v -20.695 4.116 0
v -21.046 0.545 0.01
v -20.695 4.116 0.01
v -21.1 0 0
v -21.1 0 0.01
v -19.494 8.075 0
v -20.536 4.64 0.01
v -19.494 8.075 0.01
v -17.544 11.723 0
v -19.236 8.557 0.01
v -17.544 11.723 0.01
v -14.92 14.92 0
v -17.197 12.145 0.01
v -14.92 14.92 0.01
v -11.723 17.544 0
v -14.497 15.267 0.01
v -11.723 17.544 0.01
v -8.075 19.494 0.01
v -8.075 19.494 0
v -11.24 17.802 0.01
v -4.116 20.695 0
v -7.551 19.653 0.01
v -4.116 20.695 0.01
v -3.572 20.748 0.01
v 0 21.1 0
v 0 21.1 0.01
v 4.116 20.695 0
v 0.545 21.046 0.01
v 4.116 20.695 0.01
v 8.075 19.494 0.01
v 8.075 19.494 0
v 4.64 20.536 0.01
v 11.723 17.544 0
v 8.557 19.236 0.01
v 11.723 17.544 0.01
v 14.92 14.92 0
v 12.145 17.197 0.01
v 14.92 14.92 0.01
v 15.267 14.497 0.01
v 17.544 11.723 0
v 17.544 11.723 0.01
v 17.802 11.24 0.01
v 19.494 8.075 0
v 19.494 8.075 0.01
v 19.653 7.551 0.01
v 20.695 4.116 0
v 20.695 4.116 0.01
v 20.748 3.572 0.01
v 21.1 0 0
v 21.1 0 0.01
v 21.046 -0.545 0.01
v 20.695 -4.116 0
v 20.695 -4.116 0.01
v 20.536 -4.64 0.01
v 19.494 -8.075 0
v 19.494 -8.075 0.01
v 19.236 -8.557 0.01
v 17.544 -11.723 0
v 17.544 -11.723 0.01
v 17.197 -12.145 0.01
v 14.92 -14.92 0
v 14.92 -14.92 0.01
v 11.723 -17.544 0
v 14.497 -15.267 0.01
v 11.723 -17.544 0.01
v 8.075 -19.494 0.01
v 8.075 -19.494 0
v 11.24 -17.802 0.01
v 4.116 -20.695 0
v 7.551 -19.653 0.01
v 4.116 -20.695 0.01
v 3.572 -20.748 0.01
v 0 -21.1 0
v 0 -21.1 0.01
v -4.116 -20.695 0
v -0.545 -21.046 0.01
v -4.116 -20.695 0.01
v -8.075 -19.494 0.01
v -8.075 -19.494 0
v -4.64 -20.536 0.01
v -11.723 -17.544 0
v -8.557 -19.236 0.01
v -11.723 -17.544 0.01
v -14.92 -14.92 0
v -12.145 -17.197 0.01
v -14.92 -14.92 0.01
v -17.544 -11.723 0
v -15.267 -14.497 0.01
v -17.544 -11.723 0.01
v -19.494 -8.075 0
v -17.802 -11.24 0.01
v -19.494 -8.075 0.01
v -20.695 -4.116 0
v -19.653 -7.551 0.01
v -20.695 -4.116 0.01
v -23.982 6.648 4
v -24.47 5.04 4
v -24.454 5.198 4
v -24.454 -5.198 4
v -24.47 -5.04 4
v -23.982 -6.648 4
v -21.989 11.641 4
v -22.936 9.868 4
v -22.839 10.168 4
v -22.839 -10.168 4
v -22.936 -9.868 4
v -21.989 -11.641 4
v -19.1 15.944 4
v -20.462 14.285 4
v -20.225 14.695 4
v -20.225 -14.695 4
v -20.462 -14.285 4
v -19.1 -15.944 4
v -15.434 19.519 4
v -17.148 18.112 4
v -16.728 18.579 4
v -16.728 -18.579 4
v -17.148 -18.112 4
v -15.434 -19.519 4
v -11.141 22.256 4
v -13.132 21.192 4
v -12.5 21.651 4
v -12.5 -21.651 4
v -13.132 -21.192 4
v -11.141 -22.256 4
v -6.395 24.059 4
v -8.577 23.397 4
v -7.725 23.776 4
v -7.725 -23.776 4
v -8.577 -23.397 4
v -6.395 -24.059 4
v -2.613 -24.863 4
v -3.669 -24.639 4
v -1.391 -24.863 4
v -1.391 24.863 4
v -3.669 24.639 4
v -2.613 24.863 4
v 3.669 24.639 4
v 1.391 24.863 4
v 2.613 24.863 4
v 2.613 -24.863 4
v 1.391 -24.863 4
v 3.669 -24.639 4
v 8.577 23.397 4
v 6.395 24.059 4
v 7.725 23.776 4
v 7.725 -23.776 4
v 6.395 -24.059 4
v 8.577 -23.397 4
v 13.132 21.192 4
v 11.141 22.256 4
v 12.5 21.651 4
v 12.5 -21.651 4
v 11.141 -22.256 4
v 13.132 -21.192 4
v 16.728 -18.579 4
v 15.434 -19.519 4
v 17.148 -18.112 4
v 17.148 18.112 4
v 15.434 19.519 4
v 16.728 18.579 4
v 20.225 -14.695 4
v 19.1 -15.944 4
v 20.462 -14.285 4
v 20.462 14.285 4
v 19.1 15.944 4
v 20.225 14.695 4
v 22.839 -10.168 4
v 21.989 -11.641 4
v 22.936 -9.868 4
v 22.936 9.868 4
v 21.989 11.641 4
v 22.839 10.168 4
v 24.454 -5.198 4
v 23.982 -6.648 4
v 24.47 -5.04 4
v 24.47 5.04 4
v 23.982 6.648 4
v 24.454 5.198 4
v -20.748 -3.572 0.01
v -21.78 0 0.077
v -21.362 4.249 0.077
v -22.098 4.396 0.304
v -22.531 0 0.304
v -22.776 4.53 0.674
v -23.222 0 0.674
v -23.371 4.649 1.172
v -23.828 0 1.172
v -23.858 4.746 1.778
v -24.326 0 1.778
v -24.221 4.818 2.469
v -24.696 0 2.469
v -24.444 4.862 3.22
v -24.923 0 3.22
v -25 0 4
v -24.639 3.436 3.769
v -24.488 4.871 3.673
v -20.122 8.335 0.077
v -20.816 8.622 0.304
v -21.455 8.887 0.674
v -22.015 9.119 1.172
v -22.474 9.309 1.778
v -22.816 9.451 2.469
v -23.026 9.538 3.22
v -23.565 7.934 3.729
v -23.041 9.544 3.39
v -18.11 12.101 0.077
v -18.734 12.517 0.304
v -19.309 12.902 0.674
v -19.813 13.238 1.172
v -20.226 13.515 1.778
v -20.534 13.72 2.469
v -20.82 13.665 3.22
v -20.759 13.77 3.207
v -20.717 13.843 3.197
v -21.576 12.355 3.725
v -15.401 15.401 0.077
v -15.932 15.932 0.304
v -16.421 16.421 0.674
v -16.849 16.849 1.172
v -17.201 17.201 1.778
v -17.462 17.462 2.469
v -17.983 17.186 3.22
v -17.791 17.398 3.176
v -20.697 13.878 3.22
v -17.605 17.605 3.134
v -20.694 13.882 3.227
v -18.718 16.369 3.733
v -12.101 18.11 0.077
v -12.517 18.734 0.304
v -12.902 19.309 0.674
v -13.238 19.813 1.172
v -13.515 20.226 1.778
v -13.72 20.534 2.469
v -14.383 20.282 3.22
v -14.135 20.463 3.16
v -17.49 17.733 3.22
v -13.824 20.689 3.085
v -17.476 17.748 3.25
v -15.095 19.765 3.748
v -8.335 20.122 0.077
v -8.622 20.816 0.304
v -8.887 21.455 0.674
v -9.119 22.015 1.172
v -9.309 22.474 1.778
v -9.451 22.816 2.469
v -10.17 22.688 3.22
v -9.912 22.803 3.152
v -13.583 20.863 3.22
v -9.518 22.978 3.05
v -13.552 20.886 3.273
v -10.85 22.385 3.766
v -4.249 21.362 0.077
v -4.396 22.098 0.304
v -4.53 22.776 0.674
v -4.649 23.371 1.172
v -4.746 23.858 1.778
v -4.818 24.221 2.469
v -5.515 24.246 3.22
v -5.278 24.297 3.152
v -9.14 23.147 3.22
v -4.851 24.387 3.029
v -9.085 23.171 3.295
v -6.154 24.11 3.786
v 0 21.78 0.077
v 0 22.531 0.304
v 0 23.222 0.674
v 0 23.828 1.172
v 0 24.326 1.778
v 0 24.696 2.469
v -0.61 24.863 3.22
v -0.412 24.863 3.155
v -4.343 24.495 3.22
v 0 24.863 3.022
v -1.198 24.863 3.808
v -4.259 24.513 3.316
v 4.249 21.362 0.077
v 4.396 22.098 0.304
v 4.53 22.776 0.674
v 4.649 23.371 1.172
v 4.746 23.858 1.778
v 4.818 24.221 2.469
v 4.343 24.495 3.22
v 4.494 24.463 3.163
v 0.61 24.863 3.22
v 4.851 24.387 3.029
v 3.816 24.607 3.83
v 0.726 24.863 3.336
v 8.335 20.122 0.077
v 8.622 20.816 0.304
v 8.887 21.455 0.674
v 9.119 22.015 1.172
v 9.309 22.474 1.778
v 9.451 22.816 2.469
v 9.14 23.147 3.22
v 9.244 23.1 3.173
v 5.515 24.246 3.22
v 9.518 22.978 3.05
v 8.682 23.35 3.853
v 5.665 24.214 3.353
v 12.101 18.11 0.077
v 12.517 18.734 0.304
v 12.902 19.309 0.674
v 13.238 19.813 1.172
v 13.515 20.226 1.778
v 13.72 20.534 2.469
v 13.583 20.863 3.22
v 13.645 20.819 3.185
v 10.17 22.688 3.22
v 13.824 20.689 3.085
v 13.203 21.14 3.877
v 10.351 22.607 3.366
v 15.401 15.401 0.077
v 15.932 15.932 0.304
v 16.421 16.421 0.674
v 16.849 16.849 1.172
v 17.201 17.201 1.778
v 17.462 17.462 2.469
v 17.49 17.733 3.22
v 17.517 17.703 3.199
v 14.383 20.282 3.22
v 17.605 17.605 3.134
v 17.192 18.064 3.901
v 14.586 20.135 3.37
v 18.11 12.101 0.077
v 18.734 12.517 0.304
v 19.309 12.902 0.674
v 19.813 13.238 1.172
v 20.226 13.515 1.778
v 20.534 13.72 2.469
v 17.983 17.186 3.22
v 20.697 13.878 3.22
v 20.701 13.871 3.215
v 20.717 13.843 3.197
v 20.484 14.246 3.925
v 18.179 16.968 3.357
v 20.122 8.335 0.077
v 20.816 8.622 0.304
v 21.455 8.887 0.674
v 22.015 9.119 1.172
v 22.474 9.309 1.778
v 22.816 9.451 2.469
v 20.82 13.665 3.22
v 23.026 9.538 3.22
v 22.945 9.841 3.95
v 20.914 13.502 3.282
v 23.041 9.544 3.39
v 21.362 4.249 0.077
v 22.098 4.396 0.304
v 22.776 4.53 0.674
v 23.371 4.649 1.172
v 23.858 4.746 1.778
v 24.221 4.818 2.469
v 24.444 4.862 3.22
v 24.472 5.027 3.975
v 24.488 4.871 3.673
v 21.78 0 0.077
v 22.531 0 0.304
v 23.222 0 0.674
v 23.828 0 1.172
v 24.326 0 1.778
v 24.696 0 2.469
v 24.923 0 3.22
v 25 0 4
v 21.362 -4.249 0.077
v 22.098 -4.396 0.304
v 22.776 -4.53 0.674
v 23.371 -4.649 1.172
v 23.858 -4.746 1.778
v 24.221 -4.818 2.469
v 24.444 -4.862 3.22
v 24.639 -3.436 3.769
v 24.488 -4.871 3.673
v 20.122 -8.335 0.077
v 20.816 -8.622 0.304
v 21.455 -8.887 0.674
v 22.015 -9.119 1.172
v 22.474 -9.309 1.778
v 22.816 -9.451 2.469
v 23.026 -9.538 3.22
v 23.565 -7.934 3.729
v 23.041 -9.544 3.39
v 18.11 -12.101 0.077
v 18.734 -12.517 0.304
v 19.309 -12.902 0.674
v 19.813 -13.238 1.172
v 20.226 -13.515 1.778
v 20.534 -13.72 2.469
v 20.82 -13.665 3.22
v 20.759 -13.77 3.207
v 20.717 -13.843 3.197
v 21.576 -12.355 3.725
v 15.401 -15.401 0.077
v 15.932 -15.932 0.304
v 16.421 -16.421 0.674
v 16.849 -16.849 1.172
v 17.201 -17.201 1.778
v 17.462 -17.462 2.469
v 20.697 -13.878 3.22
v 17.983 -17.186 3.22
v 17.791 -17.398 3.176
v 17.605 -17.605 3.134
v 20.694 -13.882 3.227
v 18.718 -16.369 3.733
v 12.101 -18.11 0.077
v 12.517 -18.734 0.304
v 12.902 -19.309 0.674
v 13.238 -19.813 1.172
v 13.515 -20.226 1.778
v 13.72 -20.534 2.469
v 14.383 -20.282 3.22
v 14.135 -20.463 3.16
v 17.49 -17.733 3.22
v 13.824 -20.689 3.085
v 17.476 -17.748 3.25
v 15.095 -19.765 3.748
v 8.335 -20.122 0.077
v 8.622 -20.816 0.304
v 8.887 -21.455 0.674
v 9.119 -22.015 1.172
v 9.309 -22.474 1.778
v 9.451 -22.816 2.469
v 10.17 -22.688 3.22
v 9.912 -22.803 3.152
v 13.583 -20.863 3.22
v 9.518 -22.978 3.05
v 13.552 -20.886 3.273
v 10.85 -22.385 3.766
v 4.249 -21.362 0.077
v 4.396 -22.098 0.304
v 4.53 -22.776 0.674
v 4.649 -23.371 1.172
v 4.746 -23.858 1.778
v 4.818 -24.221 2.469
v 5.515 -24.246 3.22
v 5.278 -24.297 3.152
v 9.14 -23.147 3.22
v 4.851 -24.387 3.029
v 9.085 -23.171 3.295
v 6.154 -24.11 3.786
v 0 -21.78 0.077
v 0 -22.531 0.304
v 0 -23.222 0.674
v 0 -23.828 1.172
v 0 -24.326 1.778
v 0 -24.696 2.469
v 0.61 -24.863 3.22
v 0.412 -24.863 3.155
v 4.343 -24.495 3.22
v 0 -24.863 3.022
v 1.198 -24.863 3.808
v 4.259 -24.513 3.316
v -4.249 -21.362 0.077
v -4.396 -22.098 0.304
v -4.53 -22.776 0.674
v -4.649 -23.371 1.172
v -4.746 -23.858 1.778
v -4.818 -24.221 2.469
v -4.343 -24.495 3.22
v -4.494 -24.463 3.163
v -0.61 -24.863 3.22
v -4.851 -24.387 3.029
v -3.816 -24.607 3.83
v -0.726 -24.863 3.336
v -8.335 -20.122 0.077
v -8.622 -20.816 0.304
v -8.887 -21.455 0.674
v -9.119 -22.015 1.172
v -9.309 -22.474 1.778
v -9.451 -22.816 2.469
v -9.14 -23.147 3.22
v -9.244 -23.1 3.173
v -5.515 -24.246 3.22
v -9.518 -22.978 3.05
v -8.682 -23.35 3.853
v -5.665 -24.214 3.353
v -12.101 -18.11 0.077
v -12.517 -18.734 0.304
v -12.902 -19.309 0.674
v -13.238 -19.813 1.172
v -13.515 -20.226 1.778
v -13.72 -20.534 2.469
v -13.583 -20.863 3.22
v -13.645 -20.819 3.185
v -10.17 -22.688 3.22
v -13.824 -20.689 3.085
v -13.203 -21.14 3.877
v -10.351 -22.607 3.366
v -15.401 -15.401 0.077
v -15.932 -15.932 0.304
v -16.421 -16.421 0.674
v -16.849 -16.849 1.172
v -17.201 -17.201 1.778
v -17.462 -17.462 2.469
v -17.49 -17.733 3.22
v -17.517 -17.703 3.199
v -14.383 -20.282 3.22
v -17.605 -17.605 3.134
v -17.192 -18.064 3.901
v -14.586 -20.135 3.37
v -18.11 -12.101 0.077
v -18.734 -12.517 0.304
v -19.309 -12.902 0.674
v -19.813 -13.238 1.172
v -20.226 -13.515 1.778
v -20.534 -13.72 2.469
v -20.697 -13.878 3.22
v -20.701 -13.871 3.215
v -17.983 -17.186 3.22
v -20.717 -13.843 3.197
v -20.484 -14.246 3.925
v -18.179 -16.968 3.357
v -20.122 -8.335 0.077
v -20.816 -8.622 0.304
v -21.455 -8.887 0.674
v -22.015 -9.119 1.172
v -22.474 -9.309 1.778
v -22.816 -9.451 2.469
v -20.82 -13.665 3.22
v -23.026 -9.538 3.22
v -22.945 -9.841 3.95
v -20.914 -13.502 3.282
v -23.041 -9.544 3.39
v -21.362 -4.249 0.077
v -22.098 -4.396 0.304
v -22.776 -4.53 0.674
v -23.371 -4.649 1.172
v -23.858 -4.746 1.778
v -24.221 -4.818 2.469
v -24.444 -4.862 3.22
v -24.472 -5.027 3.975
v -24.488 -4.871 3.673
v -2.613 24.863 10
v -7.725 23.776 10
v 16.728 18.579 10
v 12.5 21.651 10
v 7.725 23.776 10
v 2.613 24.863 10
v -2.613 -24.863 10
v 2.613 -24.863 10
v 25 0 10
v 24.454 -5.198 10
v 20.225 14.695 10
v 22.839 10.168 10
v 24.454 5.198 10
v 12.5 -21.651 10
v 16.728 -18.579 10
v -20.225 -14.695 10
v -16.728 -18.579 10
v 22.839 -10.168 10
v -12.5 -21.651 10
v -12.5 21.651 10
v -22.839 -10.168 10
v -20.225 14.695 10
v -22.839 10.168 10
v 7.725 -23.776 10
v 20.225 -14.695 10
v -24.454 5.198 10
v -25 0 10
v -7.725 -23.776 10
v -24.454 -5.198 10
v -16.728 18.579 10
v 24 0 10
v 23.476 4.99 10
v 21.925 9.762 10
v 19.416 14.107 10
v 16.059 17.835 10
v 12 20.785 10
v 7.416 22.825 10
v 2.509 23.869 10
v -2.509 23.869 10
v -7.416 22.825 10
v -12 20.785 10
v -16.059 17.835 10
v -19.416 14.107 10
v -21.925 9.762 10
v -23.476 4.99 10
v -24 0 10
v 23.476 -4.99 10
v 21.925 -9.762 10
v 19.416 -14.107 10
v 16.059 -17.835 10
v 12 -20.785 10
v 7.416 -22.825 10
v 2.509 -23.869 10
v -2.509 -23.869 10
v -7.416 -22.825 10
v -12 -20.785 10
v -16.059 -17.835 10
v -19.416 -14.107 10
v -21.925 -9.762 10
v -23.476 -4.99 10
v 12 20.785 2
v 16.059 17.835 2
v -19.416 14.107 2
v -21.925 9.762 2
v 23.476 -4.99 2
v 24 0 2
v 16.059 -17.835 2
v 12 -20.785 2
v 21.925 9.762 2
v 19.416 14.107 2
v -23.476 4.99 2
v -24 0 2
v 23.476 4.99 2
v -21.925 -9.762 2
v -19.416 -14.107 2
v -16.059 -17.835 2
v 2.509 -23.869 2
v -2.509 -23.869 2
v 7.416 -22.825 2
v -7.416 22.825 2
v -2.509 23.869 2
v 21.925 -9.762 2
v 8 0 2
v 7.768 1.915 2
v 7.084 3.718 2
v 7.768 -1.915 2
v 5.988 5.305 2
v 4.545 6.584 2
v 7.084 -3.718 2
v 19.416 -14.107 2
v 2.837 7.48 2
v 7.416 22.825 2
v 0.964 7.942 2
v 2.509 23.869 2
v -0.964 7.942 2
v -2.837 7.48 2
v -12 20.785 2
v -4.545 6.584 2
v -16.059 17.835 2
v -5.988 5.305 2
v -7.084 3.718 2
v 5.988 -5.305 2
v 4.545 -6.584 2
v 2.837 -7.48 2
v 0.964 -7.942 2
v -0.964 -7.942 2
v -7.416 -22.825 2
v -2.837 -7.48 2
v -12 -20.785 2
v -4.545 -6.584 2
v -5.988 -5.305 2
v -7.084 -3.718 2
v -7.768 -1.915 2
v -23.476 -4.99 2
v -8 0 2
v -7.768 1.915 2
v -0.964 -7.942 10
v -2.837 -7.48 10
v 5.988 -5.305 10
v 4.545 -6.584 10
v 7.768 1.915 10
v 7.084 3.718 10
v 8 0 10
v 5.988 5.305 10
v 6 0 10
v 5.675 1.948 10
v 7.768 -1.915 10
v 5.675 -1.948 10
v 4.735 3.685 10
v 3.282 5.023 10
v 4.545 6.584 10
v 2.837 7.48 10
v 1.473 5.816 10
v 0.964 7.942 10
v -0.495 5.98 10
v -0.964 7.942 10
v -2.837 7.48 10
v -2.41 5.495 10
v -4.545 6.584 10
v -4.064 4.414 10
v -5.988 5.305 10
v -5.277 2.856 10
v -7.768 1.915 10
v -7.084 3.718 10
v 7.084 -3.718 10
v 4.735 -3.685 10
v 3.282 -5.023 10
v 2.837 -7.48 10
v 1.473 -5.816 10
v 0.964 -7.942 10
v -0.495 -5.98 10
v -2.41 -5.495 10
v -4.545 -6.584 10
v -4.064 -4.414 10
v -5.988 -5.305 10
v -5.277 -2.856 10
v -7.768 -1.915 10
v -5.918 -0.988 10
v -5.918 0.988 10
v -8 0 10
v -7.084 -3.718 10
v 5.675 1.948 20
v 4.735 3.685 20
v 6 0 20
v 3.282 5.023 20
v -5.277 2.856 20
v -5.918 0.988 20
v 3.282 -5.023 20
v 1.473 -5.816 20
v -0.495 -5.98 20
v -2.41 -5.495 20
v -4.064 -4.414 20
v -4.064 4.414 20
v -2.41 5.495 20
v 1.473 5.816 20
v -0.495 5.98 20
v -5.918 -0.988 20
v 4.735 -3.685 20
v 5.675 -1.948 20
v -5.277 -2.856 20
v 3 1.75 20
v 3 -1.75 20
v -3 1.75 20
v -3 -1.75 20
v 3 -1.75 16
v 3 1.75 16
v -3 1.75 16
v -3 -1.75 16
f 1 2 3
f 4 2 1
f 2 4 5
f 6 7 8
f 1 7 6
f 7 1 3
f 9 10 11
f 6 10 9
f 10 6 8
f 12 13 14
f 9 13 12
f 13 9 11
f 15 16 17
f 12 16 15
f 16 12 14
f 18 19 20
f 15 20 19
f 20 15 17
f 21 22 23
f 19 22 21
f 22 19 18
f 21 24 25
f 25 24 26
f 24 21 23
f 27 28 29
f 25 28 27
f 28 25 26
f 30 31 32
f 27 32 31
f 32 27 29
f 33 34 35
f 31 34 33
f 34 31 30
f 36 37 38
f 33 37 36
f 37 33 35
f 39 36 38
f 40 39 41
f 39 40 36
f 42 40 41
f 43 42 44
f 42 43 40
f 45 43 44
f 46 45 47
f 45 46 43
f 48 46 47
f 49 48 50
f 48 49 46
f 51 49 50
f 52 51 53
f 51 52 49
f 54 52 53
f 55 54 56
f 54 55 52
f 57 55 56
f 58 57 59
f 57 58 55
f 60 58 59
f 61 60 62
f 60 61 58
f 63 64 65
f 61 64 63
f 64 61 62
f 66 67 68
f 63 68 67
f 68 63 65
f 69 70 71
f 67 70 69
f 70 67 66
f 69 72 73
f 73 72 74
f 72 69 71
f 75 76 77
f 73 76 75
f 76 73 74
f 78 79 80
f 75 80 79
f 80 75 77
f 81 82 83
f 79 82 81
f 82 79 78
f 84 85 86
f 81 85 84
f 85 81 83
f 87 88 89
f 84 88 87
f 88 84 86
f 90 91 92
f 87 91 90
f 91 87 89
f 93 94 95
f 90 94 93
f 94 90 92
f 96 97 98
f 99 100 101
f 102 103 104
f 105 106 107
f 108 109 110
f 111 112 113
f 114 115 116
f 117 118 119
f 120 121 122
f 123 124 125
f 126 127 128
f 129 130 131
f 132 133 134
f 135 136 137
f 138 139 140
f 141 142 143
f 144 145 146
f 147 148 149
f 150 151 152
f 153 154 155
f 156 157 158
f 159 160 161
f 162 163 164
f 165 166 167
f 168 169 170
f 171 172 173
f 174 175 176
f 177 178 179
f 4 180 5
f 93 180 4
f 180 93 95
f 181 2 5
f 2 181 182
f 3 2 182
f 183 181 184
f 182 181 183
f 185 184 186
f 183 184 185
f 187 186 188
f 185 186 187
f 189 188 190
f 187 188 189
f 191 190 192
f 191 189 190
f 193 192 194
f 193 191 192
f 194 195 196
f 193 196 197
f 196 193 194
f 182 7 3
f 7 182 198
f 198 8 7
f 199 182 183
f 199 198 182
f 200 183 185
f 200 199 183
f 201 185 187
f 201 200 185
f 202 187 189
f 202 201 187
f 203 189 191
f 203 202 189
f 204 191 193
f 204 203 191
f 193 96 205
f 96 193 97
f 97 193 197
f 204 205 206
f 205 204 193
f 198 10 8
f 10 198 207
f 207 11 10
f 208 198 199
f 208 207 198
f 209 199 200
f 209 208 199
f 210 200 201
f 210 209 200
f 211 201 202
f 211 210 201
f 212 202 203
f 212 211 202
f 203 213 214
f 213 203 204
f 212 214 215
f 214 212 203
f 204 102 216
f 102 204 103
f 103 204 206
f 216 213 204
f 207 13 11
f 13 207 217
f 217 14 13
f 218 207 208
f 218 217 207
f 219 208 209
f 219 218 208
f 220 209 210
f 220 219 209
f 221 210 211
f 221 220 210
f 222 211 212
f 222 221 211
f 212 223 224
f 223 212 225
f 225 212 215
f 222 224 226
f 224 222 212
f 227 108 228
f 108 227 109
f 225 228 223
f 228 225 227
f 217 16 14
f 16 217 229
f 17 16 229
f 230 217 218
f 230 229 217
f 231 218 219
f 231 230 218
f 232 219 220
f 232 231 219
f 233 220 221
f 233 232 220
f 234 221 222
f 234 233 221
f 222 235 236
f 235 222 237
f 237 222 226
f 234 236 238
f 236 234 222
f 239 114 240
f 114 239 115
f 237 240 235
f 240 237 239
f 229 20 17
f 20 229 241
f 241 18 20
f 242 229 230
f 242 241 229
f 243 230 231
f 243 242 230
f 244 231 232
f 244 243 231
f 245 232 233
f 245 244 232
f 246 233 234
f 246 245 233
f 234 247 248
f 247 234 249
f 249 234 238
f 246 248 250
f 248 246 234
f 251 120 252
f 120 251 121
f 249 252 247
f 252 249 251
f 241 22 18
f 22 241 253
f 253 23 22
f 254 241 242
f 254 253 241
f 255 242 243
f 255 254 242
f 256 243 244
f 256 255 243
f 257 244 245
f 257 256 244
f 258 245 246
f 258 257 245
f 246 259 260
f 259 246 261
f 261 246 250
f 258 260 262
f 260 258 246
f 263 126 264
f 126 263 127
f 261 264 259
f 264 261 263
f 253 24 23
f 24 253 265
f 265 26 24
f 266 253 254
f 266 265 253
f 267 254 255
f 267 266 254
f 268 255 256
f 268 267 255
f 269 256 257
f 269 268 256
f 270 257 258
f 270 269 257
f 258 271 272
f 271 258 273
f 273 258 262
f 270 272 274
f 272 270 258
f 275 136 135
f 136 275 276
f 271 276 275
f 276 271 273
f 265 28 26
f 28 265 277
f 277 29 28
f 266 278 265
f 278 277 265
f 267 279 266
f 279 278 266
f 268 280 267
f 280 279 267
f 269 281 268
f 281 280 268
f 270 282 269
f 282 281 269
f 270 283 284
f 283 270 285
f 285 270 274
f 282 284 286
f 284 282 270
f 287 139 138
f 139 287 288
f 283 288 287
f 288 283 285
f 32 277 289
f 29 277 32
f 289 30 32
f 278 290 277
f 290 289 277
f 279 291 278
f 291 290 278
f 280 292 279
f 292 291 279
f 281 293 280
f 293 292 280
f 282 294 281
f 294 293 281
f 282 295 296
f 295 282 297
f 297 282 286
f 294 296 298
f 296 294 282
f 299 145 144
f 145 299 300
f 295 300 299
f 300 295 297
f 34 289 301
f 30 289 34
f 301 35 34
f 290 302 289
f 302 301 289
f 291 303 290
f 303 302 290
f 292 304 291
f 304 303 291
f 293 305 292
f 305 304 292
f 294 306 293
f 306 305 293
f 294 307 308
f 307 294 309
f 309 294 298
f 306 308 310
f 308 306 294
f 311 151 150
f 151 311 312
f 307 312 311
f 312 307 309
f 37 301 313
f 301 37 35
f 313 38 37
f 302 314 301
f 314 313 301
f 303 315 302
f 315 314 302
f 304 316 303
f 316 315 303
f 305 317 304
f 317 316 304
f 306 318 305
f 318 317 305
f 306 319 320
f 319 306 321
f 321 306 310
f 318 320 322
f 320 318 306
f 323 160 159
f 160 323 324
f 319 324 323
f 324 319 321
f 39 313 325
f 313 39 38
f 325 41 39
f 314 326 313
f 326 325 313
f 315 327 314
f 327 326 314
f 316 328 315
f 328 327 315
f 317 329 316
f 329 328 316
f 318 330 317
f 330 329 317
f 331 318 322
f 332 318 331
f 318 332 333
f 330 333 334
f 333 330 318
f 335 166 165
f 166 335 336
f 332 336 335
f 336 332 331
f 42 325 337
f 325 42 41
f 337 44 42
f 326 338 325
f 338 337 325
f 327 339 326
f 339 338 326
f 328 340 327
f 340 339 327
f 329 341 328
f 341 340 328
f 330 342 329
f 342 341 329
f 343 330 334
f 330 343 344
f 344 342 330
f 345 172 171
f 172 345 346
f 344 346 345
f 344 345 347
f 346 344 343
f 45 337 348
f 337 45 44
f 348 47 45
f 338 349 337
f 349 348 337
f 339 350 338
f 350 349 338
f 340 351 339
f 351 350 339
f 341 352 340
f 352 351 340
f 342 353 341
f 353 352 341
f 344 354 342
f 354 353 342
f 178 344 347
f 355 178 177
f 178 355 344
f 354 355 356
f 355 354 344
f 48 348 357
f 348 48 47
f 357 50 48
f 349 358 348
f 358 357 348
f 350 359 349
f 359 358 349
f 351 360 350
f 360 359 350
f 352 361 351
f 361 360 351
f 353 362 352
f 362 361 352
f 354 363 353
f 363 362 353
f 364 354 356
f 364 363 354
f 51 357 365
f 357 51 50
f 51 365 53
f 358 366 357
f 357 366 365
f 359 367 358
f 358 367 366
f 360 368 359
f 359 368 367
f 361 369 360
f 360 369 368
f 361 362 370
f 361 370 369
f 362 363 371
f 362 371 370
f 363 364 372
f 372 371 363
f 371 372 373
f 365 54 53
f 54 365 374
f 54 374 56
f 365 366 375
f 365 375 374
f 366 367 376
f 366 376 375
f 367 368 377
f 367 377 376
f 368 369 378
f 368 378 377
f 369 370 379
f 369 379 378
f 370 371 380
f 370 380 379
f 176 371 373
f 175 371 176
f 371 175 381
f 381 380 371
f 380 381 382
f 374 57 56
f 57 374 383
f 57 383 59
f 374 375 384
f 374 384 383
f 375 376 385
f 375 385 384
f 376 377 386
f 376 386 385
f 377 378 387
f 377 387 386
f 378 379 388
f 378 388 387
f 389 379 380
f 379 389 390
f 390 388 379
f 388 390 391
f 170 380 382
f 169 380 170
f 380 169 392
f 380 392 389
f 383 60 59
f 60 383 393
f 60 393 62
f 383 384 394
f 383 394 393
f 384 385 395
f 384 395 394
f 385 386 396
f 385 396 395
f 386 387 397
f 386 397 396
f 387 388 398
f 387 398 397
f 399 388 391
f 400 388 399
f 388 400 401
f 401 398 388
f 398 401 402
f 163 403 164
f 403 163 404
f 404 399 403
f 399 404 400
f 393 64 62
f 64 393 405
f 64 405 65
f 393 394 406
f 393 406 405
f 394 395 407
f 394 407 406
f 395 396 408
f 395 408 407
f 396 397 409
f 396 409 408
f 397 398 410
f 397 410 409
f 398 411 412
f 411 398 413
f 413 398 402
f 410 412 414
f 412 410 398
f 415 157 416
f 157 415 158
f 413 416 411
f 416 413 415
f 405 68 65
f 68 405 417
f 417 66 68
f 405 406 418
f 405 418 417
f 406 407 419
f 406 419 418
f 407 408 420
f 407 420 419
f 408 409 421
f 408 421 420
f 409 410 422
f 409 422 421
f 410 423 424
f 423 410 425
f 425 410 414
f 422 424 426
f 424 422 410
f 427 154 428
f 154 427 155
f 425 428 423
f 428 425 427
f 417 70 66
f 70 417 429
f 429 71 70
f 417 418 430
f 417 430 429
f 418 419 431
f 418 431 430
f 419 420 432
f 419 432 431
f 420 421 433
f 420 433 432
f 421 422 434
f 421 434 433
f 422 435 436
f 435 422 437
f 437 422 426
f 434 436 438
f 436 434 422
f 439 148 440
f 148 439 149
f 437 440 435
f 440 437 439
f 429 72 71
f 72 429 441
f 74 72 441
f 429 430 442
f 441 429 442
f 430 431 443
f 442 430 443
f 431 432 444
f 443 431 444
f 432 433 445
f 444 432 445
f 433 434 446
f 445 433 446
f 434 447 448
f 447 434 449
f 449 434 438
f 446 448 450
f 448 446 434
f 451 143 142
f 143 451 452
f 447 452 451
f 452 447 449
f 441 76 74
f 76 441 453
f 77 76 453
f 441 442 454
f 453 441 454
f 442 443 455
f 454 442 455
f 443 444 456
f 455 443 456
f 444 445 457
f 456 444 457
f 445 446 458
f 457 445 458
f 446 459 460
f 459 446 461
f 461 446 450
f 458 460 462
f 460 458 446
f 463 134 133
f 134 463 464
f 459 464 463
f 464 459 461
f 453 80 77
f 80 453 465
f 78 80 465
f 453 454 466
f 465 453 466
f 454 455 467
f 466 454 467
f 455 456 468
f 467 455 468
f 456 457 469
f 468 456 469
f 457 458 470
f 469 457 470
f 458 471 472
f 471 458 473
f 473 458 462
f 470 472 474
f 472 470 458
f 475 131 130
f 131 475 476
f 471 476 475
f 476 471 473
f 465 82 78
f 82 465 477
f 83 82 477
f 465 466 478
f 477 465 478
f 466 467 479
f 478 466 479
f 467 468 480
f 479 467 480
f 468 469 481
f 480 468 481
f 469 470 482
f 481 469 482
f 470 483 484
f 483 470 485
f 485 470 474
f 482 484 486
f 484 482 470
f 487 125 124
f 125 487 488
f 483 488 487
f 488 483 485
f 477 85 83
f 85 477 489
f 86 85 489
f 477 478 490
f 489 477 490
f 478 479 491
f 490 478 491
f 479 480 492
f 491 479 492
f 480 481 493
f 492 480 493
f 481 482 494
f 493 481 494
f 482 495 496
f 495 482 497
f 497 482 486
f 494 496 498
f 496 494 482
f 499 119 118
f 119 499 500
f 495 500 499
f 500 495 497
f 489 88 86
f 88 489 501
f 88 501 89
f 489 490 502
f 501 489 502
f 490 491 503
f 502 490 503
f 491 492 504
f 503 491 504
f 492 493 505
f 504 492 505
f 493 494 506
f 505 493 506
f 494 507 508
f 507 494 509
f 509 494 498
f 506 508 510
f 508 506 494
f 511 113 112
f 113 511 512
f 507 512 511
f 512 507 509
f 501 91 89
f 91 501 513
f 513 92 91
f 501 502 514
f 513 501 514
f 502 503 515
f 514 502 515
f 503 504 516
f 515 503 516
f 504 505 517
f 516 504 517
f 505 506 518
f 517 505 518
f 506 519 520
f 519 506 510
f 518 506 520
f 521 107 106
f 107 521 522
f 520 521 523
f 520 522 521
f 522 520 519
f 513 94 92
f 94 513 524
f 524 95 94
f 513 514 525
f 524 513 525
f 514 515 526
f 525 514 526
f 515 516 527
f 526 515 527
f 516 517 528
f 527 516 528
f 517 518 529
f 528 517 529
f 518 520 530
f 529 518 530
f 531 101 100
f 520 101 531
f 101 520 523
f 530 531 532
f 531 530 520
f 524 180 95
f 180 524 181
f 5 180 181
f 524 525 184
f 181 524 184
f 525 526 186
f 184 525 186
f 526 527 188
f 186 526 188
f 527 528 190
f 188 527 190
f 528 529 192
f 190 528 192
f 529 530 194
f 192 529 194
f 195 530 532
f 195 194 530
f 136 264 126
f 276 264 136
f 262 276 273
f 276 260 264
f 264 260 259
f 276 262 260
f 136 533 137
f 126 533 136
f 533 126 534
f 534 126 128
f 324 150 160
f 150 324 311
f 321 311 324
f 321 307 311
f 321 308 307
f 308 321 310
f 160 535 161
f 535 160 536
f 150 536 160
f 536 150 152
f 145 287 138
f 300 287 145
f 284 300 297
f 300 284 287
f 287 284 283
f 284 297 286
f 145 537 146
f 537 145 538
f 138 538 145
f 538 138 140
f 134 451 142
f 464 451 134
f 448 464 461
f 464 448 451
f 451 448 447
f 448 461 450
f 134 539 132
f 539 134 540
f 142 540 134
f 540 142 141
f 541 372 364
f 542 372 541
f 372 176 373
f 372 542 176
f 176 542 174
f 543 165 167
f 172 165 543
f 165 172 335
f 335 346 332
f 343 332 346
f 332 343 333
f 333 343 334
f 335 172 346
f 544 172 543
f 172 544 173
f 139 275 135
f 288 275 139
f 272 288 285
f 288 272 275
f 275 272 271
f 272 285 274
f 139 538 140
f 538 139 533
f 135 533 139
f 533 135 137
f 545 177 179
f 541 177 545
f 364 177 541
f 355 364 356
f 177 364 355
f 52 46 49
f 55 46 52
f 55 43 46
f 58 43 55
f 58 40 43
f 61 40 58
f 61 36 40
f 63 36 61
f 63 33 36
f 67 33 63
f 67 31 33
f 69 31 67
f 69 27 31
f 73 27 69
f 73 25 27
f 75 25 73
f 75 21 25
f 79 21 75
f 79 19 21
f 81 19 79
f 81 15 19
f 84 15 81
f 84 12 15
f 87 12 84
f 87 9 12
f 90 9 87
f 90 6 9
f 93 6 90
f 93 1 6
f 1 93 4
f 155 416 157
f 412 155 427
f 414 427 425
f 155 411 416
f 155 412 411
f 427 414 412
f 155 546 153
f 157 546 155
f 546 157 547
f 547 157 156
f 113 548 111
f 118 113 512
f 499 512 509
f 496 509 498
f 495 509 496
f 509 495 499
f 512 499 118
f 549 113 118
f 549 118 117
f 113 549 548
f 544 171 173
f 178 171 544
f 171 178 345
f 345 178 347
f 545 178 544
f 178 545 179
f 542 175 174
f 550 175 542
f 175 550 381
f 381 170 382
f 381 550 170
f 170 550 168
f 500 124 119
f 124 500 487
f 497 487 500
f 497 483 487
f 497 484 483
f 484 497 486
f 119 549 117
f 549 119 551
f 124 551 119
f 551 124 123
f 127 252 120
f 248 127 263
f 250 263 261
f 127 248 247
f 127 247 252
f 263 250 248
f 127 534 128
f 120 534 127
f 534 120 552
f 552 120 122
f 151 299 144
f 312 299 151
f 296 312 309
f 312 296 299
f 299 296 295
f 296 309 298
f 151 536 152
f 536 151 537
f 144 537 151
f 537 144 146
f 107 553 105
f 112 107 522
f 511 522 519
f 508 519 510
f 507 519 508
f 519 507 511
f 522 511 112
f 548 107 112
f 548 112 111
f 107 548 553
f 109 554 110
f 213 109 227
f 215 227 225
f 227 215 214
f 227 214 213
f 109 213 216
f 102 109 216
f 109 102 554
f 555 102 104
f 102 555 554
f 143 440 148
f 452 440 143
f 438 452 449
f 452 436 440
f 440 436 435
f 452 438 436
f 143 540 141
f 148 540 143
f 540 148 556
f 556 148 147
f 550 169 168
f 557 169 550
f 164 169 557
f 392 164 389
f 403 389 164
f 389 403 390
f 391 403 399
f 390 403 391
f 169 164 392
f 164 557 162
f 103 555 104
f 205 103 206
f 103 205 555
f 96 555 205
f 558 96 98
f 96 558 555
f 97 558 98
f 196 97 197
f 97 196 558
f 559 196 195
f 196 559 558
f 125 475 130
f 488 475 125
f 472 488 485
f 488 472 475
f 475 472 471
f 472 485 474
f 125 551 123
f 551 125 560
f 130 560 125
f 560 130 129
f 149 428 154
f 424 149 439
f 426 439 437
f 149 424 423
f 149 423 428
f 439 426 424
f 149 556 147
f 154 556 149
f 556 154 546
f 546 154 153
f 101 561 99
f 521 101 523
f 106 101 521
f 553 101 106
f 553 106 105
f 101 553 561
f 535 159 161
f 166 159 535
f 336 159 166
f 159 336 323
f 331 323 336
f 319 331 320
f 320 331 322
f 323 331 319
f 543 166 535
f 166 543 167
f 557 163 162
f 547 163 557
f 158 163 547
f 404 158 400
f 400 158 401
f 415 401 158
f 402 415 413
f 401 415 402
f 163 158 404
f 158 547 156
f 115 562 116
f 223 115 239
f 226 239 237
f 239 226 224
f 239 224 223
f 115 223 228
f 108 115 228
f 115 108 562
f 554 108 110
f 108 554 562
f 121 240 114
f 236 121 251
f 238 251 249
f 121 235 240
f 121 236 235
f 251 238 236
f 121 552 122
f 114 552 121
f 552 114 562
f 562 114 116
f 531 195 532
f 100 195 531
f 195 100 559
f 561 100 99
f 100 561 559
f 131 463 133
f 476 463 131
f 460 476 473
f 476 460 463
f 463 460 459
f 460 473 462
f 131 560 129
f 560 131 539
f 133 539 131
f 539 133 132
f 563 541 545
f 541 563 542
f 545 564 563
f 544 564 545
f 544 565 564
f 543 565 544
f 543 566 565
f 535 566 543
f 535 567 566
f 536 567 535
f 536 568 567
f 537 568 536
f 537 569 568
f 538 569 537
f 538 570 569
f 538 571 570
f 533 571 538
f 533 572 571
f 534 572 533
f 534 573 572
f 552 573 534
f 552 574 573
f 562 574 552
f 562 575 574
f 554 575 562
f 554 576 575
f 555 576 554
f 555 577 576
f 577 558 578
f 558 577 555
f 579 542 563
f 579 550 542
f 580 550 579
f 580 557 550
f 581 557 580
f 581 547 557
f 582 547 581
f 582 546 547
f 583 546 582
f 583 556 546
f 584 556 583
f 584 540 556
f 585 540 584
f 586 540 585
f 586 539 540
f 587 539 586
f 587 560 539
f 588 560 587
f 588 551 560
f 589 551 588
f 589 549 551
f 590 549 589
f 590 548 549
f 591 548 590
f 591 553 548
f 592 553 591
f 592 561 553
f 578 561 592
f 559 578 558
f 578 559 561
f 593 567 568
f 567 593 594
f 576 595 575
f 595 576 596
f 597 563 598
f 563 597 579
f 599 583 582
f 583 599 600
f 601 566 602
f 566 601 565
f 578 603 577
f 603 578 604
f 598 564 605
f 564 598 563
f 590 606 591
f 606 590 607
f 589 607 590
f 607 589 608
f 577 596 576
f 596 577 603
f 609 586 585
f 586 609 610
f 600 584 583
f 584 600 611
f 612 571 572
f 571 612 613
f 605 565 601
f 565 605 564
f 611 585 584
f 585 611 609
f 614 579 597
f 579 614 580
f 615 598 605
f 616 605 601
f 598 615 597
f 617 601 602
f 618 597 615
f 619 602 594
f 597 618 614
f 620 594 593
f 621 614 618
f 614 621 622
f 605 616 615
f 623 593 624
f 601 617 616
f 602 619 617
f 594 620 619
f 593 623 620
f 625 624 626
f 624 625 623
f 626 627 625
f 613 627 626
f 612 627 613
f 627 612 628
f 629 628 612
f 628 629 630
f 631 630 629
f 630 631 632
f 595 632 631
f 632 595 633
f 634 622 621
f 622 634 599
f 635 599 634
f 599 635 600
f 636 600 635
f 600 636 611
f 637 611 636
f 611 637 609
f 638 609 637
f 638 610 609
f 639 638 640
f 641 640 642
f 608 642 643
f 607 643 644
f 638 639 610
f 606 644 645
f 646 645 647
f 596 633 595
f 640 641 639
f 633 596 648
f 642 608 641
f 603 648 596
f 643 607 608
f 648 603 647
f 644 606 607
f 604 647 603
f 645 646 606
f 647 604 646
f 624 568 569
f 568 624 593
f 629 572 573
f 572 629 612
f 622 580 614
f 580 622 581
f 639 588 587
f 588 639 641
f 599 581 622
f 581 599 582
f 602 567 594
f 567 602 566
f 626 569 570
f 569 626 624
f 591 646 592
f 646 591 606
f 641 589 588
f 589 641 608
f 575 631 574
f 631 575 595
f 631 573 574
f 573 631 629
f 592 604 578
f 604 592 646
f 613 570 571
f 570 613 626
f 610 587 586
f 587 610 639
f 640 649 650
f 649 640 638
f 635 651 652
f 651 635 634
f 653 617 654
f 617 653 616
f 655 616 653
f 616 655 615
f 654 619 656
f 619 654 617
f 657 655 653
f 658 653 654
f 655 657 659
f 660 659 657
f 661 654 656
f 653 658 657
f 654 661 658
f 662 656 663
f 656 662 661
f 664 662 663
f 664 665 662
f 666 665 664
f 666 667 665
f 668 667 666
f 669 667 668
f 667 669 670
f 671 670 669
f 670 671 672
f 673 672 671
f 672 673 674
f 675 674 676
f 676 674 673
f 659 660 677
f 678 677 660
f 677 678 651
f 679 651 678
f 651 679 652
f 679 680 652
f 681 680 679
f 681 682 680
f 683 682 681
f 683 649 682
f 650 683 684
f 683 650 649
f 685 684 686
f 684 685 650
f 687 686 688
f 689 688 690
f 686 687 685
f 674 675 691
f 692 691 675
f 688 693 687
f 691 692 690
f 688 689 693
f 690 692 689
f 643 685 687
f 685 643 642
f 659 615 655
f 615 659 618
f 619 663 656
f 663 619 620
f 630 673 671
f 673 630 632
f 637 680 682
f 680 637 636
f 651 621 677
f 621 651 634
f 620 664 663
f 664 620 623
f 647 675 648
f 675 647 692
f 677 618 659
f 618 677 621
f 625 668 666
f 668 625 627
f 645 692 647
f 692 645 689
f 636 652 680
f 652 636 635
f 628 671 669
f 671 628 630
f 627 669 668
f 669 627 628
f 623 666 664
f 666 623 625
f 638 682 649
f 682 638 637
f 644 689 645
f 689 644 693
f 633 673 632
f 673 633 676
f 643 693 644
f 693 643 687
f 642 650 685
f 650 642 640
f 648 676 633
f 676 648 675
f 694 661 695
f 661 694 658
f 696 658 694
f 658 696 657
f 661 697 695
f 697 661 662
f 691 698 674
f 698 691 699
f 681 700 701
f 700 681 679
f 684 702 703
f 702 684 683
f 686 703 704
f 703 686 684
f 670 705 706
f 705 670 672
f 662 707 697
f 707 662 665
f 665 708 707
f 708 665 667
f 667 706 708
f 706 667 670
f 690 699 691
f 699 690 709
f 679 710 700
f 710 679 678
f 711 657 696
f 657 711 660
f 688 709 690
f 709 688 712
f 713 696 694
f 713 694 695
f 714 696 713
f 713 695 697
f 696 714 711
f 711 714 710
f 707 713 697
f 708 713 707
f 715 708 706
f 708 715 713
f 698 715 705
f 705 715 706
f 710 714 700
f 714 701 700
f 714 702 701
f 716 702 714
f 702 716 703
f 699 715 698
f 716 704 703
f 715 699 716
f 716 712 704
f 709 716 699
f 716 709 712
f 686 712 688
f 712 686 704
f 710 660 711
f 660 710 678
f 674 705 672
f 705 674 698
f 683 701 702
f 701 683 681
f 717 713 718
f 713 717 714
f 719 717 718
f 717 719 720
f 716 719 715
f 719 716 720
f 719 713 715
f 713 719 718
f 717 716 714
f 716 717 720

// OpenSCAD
// [FL_INDEX: keywords="openscad, 3d_parametric, Koni_Sport_Shocks_Adjustment_Knob, csg_solid" | COT="Parametric OpenSCAD design from 3DCodeverse"]
// Title: Koni Sport Shocks Adjustment Knob

// These settings worked with my printer for a Koni Yellow adjustable shock.
// Your results may vary - adjust if necessary (scaling the model could work too).

/* [Tool Head] */

// The X in mm of the shock adjustor head
shock_adjuster_x = 6; 
// Y in mm of the shock adjustor head
shock_adjuster_y = 3.5;
// depth for the tool head.
shock_adjuster_height = 4;

// You probably don't need to change these but they're around for you anyway.

/* [Advanced Dimensions] */

// The radius of the outer "gripper" component
grip_radius = 25;
// The thickness of the "gripper" piece.
gripper_thickness = 2; // Less than 2mm seems pretty weak in ABS.
// The height of the gripper piece.
gripper_height = 10; // Less than 1cm is hard to grip
// The center cylinder which supports the narrow tool head
center_reinforcement_radius = 8;
// The length which the tool head extends beyond the gripper
tool_head_height = 10;
// The radius of the actual tool head
tool_head_radius = 6; 

/* [Rounded Corners] */

// Prevents "dangling" edges from the cylinder by making the rounded edge a bit bigger.
pad = .1; // Too low and you'll get non-manifold parts. Too high and you'll get gaps.

// Radius of the rounded edge.
round_radius = 4;
// How smooth to make the rounded edge
round_smooth = 32;	// Higher = smoother but big STL.

//Gripper
difference(){
	union(){
		// Hand-holder cylinder
		cylinder(r=grip_radius,h=gripper_height);
	}
	translate([0,0,0]){
		translate([0,0,gripper_thickness])
			cylinder(r=grip_radius - gripper_thickness / 2, h=gripper_height);
	}
// Bottom Round
	difference() {
		rotate_extrude(convexity=10,  $fn = round_smooth)
			translate([grip_radius-round_radius+pad,-pad,0])
				square(round_radius+pad,round_radius+pad);
		rotate_extrude(convexity=10,  $fn = round_smooth)
			translate([grip_radius-round_radius,round_radius,0])
				circle(r=round_radius,$fn=round_smooth);
	}
}
// Adjustment head
difference(){
	union(){
		// center cylinder taper (support)
		cylinder(r=center_reinforcement_radius, h=10);
    //center cylinder
		cylinder(r=tool_head_radius, h=gripper_height+tool_head_height);
	}
	// Cut-out for shock adjustor
	translate([0,0,gripper_height+tool_head_height])
		cube(size=[shock_adjuster_x,shock_adjuster_y,shock_adjuster_height*2], center=true);
}
